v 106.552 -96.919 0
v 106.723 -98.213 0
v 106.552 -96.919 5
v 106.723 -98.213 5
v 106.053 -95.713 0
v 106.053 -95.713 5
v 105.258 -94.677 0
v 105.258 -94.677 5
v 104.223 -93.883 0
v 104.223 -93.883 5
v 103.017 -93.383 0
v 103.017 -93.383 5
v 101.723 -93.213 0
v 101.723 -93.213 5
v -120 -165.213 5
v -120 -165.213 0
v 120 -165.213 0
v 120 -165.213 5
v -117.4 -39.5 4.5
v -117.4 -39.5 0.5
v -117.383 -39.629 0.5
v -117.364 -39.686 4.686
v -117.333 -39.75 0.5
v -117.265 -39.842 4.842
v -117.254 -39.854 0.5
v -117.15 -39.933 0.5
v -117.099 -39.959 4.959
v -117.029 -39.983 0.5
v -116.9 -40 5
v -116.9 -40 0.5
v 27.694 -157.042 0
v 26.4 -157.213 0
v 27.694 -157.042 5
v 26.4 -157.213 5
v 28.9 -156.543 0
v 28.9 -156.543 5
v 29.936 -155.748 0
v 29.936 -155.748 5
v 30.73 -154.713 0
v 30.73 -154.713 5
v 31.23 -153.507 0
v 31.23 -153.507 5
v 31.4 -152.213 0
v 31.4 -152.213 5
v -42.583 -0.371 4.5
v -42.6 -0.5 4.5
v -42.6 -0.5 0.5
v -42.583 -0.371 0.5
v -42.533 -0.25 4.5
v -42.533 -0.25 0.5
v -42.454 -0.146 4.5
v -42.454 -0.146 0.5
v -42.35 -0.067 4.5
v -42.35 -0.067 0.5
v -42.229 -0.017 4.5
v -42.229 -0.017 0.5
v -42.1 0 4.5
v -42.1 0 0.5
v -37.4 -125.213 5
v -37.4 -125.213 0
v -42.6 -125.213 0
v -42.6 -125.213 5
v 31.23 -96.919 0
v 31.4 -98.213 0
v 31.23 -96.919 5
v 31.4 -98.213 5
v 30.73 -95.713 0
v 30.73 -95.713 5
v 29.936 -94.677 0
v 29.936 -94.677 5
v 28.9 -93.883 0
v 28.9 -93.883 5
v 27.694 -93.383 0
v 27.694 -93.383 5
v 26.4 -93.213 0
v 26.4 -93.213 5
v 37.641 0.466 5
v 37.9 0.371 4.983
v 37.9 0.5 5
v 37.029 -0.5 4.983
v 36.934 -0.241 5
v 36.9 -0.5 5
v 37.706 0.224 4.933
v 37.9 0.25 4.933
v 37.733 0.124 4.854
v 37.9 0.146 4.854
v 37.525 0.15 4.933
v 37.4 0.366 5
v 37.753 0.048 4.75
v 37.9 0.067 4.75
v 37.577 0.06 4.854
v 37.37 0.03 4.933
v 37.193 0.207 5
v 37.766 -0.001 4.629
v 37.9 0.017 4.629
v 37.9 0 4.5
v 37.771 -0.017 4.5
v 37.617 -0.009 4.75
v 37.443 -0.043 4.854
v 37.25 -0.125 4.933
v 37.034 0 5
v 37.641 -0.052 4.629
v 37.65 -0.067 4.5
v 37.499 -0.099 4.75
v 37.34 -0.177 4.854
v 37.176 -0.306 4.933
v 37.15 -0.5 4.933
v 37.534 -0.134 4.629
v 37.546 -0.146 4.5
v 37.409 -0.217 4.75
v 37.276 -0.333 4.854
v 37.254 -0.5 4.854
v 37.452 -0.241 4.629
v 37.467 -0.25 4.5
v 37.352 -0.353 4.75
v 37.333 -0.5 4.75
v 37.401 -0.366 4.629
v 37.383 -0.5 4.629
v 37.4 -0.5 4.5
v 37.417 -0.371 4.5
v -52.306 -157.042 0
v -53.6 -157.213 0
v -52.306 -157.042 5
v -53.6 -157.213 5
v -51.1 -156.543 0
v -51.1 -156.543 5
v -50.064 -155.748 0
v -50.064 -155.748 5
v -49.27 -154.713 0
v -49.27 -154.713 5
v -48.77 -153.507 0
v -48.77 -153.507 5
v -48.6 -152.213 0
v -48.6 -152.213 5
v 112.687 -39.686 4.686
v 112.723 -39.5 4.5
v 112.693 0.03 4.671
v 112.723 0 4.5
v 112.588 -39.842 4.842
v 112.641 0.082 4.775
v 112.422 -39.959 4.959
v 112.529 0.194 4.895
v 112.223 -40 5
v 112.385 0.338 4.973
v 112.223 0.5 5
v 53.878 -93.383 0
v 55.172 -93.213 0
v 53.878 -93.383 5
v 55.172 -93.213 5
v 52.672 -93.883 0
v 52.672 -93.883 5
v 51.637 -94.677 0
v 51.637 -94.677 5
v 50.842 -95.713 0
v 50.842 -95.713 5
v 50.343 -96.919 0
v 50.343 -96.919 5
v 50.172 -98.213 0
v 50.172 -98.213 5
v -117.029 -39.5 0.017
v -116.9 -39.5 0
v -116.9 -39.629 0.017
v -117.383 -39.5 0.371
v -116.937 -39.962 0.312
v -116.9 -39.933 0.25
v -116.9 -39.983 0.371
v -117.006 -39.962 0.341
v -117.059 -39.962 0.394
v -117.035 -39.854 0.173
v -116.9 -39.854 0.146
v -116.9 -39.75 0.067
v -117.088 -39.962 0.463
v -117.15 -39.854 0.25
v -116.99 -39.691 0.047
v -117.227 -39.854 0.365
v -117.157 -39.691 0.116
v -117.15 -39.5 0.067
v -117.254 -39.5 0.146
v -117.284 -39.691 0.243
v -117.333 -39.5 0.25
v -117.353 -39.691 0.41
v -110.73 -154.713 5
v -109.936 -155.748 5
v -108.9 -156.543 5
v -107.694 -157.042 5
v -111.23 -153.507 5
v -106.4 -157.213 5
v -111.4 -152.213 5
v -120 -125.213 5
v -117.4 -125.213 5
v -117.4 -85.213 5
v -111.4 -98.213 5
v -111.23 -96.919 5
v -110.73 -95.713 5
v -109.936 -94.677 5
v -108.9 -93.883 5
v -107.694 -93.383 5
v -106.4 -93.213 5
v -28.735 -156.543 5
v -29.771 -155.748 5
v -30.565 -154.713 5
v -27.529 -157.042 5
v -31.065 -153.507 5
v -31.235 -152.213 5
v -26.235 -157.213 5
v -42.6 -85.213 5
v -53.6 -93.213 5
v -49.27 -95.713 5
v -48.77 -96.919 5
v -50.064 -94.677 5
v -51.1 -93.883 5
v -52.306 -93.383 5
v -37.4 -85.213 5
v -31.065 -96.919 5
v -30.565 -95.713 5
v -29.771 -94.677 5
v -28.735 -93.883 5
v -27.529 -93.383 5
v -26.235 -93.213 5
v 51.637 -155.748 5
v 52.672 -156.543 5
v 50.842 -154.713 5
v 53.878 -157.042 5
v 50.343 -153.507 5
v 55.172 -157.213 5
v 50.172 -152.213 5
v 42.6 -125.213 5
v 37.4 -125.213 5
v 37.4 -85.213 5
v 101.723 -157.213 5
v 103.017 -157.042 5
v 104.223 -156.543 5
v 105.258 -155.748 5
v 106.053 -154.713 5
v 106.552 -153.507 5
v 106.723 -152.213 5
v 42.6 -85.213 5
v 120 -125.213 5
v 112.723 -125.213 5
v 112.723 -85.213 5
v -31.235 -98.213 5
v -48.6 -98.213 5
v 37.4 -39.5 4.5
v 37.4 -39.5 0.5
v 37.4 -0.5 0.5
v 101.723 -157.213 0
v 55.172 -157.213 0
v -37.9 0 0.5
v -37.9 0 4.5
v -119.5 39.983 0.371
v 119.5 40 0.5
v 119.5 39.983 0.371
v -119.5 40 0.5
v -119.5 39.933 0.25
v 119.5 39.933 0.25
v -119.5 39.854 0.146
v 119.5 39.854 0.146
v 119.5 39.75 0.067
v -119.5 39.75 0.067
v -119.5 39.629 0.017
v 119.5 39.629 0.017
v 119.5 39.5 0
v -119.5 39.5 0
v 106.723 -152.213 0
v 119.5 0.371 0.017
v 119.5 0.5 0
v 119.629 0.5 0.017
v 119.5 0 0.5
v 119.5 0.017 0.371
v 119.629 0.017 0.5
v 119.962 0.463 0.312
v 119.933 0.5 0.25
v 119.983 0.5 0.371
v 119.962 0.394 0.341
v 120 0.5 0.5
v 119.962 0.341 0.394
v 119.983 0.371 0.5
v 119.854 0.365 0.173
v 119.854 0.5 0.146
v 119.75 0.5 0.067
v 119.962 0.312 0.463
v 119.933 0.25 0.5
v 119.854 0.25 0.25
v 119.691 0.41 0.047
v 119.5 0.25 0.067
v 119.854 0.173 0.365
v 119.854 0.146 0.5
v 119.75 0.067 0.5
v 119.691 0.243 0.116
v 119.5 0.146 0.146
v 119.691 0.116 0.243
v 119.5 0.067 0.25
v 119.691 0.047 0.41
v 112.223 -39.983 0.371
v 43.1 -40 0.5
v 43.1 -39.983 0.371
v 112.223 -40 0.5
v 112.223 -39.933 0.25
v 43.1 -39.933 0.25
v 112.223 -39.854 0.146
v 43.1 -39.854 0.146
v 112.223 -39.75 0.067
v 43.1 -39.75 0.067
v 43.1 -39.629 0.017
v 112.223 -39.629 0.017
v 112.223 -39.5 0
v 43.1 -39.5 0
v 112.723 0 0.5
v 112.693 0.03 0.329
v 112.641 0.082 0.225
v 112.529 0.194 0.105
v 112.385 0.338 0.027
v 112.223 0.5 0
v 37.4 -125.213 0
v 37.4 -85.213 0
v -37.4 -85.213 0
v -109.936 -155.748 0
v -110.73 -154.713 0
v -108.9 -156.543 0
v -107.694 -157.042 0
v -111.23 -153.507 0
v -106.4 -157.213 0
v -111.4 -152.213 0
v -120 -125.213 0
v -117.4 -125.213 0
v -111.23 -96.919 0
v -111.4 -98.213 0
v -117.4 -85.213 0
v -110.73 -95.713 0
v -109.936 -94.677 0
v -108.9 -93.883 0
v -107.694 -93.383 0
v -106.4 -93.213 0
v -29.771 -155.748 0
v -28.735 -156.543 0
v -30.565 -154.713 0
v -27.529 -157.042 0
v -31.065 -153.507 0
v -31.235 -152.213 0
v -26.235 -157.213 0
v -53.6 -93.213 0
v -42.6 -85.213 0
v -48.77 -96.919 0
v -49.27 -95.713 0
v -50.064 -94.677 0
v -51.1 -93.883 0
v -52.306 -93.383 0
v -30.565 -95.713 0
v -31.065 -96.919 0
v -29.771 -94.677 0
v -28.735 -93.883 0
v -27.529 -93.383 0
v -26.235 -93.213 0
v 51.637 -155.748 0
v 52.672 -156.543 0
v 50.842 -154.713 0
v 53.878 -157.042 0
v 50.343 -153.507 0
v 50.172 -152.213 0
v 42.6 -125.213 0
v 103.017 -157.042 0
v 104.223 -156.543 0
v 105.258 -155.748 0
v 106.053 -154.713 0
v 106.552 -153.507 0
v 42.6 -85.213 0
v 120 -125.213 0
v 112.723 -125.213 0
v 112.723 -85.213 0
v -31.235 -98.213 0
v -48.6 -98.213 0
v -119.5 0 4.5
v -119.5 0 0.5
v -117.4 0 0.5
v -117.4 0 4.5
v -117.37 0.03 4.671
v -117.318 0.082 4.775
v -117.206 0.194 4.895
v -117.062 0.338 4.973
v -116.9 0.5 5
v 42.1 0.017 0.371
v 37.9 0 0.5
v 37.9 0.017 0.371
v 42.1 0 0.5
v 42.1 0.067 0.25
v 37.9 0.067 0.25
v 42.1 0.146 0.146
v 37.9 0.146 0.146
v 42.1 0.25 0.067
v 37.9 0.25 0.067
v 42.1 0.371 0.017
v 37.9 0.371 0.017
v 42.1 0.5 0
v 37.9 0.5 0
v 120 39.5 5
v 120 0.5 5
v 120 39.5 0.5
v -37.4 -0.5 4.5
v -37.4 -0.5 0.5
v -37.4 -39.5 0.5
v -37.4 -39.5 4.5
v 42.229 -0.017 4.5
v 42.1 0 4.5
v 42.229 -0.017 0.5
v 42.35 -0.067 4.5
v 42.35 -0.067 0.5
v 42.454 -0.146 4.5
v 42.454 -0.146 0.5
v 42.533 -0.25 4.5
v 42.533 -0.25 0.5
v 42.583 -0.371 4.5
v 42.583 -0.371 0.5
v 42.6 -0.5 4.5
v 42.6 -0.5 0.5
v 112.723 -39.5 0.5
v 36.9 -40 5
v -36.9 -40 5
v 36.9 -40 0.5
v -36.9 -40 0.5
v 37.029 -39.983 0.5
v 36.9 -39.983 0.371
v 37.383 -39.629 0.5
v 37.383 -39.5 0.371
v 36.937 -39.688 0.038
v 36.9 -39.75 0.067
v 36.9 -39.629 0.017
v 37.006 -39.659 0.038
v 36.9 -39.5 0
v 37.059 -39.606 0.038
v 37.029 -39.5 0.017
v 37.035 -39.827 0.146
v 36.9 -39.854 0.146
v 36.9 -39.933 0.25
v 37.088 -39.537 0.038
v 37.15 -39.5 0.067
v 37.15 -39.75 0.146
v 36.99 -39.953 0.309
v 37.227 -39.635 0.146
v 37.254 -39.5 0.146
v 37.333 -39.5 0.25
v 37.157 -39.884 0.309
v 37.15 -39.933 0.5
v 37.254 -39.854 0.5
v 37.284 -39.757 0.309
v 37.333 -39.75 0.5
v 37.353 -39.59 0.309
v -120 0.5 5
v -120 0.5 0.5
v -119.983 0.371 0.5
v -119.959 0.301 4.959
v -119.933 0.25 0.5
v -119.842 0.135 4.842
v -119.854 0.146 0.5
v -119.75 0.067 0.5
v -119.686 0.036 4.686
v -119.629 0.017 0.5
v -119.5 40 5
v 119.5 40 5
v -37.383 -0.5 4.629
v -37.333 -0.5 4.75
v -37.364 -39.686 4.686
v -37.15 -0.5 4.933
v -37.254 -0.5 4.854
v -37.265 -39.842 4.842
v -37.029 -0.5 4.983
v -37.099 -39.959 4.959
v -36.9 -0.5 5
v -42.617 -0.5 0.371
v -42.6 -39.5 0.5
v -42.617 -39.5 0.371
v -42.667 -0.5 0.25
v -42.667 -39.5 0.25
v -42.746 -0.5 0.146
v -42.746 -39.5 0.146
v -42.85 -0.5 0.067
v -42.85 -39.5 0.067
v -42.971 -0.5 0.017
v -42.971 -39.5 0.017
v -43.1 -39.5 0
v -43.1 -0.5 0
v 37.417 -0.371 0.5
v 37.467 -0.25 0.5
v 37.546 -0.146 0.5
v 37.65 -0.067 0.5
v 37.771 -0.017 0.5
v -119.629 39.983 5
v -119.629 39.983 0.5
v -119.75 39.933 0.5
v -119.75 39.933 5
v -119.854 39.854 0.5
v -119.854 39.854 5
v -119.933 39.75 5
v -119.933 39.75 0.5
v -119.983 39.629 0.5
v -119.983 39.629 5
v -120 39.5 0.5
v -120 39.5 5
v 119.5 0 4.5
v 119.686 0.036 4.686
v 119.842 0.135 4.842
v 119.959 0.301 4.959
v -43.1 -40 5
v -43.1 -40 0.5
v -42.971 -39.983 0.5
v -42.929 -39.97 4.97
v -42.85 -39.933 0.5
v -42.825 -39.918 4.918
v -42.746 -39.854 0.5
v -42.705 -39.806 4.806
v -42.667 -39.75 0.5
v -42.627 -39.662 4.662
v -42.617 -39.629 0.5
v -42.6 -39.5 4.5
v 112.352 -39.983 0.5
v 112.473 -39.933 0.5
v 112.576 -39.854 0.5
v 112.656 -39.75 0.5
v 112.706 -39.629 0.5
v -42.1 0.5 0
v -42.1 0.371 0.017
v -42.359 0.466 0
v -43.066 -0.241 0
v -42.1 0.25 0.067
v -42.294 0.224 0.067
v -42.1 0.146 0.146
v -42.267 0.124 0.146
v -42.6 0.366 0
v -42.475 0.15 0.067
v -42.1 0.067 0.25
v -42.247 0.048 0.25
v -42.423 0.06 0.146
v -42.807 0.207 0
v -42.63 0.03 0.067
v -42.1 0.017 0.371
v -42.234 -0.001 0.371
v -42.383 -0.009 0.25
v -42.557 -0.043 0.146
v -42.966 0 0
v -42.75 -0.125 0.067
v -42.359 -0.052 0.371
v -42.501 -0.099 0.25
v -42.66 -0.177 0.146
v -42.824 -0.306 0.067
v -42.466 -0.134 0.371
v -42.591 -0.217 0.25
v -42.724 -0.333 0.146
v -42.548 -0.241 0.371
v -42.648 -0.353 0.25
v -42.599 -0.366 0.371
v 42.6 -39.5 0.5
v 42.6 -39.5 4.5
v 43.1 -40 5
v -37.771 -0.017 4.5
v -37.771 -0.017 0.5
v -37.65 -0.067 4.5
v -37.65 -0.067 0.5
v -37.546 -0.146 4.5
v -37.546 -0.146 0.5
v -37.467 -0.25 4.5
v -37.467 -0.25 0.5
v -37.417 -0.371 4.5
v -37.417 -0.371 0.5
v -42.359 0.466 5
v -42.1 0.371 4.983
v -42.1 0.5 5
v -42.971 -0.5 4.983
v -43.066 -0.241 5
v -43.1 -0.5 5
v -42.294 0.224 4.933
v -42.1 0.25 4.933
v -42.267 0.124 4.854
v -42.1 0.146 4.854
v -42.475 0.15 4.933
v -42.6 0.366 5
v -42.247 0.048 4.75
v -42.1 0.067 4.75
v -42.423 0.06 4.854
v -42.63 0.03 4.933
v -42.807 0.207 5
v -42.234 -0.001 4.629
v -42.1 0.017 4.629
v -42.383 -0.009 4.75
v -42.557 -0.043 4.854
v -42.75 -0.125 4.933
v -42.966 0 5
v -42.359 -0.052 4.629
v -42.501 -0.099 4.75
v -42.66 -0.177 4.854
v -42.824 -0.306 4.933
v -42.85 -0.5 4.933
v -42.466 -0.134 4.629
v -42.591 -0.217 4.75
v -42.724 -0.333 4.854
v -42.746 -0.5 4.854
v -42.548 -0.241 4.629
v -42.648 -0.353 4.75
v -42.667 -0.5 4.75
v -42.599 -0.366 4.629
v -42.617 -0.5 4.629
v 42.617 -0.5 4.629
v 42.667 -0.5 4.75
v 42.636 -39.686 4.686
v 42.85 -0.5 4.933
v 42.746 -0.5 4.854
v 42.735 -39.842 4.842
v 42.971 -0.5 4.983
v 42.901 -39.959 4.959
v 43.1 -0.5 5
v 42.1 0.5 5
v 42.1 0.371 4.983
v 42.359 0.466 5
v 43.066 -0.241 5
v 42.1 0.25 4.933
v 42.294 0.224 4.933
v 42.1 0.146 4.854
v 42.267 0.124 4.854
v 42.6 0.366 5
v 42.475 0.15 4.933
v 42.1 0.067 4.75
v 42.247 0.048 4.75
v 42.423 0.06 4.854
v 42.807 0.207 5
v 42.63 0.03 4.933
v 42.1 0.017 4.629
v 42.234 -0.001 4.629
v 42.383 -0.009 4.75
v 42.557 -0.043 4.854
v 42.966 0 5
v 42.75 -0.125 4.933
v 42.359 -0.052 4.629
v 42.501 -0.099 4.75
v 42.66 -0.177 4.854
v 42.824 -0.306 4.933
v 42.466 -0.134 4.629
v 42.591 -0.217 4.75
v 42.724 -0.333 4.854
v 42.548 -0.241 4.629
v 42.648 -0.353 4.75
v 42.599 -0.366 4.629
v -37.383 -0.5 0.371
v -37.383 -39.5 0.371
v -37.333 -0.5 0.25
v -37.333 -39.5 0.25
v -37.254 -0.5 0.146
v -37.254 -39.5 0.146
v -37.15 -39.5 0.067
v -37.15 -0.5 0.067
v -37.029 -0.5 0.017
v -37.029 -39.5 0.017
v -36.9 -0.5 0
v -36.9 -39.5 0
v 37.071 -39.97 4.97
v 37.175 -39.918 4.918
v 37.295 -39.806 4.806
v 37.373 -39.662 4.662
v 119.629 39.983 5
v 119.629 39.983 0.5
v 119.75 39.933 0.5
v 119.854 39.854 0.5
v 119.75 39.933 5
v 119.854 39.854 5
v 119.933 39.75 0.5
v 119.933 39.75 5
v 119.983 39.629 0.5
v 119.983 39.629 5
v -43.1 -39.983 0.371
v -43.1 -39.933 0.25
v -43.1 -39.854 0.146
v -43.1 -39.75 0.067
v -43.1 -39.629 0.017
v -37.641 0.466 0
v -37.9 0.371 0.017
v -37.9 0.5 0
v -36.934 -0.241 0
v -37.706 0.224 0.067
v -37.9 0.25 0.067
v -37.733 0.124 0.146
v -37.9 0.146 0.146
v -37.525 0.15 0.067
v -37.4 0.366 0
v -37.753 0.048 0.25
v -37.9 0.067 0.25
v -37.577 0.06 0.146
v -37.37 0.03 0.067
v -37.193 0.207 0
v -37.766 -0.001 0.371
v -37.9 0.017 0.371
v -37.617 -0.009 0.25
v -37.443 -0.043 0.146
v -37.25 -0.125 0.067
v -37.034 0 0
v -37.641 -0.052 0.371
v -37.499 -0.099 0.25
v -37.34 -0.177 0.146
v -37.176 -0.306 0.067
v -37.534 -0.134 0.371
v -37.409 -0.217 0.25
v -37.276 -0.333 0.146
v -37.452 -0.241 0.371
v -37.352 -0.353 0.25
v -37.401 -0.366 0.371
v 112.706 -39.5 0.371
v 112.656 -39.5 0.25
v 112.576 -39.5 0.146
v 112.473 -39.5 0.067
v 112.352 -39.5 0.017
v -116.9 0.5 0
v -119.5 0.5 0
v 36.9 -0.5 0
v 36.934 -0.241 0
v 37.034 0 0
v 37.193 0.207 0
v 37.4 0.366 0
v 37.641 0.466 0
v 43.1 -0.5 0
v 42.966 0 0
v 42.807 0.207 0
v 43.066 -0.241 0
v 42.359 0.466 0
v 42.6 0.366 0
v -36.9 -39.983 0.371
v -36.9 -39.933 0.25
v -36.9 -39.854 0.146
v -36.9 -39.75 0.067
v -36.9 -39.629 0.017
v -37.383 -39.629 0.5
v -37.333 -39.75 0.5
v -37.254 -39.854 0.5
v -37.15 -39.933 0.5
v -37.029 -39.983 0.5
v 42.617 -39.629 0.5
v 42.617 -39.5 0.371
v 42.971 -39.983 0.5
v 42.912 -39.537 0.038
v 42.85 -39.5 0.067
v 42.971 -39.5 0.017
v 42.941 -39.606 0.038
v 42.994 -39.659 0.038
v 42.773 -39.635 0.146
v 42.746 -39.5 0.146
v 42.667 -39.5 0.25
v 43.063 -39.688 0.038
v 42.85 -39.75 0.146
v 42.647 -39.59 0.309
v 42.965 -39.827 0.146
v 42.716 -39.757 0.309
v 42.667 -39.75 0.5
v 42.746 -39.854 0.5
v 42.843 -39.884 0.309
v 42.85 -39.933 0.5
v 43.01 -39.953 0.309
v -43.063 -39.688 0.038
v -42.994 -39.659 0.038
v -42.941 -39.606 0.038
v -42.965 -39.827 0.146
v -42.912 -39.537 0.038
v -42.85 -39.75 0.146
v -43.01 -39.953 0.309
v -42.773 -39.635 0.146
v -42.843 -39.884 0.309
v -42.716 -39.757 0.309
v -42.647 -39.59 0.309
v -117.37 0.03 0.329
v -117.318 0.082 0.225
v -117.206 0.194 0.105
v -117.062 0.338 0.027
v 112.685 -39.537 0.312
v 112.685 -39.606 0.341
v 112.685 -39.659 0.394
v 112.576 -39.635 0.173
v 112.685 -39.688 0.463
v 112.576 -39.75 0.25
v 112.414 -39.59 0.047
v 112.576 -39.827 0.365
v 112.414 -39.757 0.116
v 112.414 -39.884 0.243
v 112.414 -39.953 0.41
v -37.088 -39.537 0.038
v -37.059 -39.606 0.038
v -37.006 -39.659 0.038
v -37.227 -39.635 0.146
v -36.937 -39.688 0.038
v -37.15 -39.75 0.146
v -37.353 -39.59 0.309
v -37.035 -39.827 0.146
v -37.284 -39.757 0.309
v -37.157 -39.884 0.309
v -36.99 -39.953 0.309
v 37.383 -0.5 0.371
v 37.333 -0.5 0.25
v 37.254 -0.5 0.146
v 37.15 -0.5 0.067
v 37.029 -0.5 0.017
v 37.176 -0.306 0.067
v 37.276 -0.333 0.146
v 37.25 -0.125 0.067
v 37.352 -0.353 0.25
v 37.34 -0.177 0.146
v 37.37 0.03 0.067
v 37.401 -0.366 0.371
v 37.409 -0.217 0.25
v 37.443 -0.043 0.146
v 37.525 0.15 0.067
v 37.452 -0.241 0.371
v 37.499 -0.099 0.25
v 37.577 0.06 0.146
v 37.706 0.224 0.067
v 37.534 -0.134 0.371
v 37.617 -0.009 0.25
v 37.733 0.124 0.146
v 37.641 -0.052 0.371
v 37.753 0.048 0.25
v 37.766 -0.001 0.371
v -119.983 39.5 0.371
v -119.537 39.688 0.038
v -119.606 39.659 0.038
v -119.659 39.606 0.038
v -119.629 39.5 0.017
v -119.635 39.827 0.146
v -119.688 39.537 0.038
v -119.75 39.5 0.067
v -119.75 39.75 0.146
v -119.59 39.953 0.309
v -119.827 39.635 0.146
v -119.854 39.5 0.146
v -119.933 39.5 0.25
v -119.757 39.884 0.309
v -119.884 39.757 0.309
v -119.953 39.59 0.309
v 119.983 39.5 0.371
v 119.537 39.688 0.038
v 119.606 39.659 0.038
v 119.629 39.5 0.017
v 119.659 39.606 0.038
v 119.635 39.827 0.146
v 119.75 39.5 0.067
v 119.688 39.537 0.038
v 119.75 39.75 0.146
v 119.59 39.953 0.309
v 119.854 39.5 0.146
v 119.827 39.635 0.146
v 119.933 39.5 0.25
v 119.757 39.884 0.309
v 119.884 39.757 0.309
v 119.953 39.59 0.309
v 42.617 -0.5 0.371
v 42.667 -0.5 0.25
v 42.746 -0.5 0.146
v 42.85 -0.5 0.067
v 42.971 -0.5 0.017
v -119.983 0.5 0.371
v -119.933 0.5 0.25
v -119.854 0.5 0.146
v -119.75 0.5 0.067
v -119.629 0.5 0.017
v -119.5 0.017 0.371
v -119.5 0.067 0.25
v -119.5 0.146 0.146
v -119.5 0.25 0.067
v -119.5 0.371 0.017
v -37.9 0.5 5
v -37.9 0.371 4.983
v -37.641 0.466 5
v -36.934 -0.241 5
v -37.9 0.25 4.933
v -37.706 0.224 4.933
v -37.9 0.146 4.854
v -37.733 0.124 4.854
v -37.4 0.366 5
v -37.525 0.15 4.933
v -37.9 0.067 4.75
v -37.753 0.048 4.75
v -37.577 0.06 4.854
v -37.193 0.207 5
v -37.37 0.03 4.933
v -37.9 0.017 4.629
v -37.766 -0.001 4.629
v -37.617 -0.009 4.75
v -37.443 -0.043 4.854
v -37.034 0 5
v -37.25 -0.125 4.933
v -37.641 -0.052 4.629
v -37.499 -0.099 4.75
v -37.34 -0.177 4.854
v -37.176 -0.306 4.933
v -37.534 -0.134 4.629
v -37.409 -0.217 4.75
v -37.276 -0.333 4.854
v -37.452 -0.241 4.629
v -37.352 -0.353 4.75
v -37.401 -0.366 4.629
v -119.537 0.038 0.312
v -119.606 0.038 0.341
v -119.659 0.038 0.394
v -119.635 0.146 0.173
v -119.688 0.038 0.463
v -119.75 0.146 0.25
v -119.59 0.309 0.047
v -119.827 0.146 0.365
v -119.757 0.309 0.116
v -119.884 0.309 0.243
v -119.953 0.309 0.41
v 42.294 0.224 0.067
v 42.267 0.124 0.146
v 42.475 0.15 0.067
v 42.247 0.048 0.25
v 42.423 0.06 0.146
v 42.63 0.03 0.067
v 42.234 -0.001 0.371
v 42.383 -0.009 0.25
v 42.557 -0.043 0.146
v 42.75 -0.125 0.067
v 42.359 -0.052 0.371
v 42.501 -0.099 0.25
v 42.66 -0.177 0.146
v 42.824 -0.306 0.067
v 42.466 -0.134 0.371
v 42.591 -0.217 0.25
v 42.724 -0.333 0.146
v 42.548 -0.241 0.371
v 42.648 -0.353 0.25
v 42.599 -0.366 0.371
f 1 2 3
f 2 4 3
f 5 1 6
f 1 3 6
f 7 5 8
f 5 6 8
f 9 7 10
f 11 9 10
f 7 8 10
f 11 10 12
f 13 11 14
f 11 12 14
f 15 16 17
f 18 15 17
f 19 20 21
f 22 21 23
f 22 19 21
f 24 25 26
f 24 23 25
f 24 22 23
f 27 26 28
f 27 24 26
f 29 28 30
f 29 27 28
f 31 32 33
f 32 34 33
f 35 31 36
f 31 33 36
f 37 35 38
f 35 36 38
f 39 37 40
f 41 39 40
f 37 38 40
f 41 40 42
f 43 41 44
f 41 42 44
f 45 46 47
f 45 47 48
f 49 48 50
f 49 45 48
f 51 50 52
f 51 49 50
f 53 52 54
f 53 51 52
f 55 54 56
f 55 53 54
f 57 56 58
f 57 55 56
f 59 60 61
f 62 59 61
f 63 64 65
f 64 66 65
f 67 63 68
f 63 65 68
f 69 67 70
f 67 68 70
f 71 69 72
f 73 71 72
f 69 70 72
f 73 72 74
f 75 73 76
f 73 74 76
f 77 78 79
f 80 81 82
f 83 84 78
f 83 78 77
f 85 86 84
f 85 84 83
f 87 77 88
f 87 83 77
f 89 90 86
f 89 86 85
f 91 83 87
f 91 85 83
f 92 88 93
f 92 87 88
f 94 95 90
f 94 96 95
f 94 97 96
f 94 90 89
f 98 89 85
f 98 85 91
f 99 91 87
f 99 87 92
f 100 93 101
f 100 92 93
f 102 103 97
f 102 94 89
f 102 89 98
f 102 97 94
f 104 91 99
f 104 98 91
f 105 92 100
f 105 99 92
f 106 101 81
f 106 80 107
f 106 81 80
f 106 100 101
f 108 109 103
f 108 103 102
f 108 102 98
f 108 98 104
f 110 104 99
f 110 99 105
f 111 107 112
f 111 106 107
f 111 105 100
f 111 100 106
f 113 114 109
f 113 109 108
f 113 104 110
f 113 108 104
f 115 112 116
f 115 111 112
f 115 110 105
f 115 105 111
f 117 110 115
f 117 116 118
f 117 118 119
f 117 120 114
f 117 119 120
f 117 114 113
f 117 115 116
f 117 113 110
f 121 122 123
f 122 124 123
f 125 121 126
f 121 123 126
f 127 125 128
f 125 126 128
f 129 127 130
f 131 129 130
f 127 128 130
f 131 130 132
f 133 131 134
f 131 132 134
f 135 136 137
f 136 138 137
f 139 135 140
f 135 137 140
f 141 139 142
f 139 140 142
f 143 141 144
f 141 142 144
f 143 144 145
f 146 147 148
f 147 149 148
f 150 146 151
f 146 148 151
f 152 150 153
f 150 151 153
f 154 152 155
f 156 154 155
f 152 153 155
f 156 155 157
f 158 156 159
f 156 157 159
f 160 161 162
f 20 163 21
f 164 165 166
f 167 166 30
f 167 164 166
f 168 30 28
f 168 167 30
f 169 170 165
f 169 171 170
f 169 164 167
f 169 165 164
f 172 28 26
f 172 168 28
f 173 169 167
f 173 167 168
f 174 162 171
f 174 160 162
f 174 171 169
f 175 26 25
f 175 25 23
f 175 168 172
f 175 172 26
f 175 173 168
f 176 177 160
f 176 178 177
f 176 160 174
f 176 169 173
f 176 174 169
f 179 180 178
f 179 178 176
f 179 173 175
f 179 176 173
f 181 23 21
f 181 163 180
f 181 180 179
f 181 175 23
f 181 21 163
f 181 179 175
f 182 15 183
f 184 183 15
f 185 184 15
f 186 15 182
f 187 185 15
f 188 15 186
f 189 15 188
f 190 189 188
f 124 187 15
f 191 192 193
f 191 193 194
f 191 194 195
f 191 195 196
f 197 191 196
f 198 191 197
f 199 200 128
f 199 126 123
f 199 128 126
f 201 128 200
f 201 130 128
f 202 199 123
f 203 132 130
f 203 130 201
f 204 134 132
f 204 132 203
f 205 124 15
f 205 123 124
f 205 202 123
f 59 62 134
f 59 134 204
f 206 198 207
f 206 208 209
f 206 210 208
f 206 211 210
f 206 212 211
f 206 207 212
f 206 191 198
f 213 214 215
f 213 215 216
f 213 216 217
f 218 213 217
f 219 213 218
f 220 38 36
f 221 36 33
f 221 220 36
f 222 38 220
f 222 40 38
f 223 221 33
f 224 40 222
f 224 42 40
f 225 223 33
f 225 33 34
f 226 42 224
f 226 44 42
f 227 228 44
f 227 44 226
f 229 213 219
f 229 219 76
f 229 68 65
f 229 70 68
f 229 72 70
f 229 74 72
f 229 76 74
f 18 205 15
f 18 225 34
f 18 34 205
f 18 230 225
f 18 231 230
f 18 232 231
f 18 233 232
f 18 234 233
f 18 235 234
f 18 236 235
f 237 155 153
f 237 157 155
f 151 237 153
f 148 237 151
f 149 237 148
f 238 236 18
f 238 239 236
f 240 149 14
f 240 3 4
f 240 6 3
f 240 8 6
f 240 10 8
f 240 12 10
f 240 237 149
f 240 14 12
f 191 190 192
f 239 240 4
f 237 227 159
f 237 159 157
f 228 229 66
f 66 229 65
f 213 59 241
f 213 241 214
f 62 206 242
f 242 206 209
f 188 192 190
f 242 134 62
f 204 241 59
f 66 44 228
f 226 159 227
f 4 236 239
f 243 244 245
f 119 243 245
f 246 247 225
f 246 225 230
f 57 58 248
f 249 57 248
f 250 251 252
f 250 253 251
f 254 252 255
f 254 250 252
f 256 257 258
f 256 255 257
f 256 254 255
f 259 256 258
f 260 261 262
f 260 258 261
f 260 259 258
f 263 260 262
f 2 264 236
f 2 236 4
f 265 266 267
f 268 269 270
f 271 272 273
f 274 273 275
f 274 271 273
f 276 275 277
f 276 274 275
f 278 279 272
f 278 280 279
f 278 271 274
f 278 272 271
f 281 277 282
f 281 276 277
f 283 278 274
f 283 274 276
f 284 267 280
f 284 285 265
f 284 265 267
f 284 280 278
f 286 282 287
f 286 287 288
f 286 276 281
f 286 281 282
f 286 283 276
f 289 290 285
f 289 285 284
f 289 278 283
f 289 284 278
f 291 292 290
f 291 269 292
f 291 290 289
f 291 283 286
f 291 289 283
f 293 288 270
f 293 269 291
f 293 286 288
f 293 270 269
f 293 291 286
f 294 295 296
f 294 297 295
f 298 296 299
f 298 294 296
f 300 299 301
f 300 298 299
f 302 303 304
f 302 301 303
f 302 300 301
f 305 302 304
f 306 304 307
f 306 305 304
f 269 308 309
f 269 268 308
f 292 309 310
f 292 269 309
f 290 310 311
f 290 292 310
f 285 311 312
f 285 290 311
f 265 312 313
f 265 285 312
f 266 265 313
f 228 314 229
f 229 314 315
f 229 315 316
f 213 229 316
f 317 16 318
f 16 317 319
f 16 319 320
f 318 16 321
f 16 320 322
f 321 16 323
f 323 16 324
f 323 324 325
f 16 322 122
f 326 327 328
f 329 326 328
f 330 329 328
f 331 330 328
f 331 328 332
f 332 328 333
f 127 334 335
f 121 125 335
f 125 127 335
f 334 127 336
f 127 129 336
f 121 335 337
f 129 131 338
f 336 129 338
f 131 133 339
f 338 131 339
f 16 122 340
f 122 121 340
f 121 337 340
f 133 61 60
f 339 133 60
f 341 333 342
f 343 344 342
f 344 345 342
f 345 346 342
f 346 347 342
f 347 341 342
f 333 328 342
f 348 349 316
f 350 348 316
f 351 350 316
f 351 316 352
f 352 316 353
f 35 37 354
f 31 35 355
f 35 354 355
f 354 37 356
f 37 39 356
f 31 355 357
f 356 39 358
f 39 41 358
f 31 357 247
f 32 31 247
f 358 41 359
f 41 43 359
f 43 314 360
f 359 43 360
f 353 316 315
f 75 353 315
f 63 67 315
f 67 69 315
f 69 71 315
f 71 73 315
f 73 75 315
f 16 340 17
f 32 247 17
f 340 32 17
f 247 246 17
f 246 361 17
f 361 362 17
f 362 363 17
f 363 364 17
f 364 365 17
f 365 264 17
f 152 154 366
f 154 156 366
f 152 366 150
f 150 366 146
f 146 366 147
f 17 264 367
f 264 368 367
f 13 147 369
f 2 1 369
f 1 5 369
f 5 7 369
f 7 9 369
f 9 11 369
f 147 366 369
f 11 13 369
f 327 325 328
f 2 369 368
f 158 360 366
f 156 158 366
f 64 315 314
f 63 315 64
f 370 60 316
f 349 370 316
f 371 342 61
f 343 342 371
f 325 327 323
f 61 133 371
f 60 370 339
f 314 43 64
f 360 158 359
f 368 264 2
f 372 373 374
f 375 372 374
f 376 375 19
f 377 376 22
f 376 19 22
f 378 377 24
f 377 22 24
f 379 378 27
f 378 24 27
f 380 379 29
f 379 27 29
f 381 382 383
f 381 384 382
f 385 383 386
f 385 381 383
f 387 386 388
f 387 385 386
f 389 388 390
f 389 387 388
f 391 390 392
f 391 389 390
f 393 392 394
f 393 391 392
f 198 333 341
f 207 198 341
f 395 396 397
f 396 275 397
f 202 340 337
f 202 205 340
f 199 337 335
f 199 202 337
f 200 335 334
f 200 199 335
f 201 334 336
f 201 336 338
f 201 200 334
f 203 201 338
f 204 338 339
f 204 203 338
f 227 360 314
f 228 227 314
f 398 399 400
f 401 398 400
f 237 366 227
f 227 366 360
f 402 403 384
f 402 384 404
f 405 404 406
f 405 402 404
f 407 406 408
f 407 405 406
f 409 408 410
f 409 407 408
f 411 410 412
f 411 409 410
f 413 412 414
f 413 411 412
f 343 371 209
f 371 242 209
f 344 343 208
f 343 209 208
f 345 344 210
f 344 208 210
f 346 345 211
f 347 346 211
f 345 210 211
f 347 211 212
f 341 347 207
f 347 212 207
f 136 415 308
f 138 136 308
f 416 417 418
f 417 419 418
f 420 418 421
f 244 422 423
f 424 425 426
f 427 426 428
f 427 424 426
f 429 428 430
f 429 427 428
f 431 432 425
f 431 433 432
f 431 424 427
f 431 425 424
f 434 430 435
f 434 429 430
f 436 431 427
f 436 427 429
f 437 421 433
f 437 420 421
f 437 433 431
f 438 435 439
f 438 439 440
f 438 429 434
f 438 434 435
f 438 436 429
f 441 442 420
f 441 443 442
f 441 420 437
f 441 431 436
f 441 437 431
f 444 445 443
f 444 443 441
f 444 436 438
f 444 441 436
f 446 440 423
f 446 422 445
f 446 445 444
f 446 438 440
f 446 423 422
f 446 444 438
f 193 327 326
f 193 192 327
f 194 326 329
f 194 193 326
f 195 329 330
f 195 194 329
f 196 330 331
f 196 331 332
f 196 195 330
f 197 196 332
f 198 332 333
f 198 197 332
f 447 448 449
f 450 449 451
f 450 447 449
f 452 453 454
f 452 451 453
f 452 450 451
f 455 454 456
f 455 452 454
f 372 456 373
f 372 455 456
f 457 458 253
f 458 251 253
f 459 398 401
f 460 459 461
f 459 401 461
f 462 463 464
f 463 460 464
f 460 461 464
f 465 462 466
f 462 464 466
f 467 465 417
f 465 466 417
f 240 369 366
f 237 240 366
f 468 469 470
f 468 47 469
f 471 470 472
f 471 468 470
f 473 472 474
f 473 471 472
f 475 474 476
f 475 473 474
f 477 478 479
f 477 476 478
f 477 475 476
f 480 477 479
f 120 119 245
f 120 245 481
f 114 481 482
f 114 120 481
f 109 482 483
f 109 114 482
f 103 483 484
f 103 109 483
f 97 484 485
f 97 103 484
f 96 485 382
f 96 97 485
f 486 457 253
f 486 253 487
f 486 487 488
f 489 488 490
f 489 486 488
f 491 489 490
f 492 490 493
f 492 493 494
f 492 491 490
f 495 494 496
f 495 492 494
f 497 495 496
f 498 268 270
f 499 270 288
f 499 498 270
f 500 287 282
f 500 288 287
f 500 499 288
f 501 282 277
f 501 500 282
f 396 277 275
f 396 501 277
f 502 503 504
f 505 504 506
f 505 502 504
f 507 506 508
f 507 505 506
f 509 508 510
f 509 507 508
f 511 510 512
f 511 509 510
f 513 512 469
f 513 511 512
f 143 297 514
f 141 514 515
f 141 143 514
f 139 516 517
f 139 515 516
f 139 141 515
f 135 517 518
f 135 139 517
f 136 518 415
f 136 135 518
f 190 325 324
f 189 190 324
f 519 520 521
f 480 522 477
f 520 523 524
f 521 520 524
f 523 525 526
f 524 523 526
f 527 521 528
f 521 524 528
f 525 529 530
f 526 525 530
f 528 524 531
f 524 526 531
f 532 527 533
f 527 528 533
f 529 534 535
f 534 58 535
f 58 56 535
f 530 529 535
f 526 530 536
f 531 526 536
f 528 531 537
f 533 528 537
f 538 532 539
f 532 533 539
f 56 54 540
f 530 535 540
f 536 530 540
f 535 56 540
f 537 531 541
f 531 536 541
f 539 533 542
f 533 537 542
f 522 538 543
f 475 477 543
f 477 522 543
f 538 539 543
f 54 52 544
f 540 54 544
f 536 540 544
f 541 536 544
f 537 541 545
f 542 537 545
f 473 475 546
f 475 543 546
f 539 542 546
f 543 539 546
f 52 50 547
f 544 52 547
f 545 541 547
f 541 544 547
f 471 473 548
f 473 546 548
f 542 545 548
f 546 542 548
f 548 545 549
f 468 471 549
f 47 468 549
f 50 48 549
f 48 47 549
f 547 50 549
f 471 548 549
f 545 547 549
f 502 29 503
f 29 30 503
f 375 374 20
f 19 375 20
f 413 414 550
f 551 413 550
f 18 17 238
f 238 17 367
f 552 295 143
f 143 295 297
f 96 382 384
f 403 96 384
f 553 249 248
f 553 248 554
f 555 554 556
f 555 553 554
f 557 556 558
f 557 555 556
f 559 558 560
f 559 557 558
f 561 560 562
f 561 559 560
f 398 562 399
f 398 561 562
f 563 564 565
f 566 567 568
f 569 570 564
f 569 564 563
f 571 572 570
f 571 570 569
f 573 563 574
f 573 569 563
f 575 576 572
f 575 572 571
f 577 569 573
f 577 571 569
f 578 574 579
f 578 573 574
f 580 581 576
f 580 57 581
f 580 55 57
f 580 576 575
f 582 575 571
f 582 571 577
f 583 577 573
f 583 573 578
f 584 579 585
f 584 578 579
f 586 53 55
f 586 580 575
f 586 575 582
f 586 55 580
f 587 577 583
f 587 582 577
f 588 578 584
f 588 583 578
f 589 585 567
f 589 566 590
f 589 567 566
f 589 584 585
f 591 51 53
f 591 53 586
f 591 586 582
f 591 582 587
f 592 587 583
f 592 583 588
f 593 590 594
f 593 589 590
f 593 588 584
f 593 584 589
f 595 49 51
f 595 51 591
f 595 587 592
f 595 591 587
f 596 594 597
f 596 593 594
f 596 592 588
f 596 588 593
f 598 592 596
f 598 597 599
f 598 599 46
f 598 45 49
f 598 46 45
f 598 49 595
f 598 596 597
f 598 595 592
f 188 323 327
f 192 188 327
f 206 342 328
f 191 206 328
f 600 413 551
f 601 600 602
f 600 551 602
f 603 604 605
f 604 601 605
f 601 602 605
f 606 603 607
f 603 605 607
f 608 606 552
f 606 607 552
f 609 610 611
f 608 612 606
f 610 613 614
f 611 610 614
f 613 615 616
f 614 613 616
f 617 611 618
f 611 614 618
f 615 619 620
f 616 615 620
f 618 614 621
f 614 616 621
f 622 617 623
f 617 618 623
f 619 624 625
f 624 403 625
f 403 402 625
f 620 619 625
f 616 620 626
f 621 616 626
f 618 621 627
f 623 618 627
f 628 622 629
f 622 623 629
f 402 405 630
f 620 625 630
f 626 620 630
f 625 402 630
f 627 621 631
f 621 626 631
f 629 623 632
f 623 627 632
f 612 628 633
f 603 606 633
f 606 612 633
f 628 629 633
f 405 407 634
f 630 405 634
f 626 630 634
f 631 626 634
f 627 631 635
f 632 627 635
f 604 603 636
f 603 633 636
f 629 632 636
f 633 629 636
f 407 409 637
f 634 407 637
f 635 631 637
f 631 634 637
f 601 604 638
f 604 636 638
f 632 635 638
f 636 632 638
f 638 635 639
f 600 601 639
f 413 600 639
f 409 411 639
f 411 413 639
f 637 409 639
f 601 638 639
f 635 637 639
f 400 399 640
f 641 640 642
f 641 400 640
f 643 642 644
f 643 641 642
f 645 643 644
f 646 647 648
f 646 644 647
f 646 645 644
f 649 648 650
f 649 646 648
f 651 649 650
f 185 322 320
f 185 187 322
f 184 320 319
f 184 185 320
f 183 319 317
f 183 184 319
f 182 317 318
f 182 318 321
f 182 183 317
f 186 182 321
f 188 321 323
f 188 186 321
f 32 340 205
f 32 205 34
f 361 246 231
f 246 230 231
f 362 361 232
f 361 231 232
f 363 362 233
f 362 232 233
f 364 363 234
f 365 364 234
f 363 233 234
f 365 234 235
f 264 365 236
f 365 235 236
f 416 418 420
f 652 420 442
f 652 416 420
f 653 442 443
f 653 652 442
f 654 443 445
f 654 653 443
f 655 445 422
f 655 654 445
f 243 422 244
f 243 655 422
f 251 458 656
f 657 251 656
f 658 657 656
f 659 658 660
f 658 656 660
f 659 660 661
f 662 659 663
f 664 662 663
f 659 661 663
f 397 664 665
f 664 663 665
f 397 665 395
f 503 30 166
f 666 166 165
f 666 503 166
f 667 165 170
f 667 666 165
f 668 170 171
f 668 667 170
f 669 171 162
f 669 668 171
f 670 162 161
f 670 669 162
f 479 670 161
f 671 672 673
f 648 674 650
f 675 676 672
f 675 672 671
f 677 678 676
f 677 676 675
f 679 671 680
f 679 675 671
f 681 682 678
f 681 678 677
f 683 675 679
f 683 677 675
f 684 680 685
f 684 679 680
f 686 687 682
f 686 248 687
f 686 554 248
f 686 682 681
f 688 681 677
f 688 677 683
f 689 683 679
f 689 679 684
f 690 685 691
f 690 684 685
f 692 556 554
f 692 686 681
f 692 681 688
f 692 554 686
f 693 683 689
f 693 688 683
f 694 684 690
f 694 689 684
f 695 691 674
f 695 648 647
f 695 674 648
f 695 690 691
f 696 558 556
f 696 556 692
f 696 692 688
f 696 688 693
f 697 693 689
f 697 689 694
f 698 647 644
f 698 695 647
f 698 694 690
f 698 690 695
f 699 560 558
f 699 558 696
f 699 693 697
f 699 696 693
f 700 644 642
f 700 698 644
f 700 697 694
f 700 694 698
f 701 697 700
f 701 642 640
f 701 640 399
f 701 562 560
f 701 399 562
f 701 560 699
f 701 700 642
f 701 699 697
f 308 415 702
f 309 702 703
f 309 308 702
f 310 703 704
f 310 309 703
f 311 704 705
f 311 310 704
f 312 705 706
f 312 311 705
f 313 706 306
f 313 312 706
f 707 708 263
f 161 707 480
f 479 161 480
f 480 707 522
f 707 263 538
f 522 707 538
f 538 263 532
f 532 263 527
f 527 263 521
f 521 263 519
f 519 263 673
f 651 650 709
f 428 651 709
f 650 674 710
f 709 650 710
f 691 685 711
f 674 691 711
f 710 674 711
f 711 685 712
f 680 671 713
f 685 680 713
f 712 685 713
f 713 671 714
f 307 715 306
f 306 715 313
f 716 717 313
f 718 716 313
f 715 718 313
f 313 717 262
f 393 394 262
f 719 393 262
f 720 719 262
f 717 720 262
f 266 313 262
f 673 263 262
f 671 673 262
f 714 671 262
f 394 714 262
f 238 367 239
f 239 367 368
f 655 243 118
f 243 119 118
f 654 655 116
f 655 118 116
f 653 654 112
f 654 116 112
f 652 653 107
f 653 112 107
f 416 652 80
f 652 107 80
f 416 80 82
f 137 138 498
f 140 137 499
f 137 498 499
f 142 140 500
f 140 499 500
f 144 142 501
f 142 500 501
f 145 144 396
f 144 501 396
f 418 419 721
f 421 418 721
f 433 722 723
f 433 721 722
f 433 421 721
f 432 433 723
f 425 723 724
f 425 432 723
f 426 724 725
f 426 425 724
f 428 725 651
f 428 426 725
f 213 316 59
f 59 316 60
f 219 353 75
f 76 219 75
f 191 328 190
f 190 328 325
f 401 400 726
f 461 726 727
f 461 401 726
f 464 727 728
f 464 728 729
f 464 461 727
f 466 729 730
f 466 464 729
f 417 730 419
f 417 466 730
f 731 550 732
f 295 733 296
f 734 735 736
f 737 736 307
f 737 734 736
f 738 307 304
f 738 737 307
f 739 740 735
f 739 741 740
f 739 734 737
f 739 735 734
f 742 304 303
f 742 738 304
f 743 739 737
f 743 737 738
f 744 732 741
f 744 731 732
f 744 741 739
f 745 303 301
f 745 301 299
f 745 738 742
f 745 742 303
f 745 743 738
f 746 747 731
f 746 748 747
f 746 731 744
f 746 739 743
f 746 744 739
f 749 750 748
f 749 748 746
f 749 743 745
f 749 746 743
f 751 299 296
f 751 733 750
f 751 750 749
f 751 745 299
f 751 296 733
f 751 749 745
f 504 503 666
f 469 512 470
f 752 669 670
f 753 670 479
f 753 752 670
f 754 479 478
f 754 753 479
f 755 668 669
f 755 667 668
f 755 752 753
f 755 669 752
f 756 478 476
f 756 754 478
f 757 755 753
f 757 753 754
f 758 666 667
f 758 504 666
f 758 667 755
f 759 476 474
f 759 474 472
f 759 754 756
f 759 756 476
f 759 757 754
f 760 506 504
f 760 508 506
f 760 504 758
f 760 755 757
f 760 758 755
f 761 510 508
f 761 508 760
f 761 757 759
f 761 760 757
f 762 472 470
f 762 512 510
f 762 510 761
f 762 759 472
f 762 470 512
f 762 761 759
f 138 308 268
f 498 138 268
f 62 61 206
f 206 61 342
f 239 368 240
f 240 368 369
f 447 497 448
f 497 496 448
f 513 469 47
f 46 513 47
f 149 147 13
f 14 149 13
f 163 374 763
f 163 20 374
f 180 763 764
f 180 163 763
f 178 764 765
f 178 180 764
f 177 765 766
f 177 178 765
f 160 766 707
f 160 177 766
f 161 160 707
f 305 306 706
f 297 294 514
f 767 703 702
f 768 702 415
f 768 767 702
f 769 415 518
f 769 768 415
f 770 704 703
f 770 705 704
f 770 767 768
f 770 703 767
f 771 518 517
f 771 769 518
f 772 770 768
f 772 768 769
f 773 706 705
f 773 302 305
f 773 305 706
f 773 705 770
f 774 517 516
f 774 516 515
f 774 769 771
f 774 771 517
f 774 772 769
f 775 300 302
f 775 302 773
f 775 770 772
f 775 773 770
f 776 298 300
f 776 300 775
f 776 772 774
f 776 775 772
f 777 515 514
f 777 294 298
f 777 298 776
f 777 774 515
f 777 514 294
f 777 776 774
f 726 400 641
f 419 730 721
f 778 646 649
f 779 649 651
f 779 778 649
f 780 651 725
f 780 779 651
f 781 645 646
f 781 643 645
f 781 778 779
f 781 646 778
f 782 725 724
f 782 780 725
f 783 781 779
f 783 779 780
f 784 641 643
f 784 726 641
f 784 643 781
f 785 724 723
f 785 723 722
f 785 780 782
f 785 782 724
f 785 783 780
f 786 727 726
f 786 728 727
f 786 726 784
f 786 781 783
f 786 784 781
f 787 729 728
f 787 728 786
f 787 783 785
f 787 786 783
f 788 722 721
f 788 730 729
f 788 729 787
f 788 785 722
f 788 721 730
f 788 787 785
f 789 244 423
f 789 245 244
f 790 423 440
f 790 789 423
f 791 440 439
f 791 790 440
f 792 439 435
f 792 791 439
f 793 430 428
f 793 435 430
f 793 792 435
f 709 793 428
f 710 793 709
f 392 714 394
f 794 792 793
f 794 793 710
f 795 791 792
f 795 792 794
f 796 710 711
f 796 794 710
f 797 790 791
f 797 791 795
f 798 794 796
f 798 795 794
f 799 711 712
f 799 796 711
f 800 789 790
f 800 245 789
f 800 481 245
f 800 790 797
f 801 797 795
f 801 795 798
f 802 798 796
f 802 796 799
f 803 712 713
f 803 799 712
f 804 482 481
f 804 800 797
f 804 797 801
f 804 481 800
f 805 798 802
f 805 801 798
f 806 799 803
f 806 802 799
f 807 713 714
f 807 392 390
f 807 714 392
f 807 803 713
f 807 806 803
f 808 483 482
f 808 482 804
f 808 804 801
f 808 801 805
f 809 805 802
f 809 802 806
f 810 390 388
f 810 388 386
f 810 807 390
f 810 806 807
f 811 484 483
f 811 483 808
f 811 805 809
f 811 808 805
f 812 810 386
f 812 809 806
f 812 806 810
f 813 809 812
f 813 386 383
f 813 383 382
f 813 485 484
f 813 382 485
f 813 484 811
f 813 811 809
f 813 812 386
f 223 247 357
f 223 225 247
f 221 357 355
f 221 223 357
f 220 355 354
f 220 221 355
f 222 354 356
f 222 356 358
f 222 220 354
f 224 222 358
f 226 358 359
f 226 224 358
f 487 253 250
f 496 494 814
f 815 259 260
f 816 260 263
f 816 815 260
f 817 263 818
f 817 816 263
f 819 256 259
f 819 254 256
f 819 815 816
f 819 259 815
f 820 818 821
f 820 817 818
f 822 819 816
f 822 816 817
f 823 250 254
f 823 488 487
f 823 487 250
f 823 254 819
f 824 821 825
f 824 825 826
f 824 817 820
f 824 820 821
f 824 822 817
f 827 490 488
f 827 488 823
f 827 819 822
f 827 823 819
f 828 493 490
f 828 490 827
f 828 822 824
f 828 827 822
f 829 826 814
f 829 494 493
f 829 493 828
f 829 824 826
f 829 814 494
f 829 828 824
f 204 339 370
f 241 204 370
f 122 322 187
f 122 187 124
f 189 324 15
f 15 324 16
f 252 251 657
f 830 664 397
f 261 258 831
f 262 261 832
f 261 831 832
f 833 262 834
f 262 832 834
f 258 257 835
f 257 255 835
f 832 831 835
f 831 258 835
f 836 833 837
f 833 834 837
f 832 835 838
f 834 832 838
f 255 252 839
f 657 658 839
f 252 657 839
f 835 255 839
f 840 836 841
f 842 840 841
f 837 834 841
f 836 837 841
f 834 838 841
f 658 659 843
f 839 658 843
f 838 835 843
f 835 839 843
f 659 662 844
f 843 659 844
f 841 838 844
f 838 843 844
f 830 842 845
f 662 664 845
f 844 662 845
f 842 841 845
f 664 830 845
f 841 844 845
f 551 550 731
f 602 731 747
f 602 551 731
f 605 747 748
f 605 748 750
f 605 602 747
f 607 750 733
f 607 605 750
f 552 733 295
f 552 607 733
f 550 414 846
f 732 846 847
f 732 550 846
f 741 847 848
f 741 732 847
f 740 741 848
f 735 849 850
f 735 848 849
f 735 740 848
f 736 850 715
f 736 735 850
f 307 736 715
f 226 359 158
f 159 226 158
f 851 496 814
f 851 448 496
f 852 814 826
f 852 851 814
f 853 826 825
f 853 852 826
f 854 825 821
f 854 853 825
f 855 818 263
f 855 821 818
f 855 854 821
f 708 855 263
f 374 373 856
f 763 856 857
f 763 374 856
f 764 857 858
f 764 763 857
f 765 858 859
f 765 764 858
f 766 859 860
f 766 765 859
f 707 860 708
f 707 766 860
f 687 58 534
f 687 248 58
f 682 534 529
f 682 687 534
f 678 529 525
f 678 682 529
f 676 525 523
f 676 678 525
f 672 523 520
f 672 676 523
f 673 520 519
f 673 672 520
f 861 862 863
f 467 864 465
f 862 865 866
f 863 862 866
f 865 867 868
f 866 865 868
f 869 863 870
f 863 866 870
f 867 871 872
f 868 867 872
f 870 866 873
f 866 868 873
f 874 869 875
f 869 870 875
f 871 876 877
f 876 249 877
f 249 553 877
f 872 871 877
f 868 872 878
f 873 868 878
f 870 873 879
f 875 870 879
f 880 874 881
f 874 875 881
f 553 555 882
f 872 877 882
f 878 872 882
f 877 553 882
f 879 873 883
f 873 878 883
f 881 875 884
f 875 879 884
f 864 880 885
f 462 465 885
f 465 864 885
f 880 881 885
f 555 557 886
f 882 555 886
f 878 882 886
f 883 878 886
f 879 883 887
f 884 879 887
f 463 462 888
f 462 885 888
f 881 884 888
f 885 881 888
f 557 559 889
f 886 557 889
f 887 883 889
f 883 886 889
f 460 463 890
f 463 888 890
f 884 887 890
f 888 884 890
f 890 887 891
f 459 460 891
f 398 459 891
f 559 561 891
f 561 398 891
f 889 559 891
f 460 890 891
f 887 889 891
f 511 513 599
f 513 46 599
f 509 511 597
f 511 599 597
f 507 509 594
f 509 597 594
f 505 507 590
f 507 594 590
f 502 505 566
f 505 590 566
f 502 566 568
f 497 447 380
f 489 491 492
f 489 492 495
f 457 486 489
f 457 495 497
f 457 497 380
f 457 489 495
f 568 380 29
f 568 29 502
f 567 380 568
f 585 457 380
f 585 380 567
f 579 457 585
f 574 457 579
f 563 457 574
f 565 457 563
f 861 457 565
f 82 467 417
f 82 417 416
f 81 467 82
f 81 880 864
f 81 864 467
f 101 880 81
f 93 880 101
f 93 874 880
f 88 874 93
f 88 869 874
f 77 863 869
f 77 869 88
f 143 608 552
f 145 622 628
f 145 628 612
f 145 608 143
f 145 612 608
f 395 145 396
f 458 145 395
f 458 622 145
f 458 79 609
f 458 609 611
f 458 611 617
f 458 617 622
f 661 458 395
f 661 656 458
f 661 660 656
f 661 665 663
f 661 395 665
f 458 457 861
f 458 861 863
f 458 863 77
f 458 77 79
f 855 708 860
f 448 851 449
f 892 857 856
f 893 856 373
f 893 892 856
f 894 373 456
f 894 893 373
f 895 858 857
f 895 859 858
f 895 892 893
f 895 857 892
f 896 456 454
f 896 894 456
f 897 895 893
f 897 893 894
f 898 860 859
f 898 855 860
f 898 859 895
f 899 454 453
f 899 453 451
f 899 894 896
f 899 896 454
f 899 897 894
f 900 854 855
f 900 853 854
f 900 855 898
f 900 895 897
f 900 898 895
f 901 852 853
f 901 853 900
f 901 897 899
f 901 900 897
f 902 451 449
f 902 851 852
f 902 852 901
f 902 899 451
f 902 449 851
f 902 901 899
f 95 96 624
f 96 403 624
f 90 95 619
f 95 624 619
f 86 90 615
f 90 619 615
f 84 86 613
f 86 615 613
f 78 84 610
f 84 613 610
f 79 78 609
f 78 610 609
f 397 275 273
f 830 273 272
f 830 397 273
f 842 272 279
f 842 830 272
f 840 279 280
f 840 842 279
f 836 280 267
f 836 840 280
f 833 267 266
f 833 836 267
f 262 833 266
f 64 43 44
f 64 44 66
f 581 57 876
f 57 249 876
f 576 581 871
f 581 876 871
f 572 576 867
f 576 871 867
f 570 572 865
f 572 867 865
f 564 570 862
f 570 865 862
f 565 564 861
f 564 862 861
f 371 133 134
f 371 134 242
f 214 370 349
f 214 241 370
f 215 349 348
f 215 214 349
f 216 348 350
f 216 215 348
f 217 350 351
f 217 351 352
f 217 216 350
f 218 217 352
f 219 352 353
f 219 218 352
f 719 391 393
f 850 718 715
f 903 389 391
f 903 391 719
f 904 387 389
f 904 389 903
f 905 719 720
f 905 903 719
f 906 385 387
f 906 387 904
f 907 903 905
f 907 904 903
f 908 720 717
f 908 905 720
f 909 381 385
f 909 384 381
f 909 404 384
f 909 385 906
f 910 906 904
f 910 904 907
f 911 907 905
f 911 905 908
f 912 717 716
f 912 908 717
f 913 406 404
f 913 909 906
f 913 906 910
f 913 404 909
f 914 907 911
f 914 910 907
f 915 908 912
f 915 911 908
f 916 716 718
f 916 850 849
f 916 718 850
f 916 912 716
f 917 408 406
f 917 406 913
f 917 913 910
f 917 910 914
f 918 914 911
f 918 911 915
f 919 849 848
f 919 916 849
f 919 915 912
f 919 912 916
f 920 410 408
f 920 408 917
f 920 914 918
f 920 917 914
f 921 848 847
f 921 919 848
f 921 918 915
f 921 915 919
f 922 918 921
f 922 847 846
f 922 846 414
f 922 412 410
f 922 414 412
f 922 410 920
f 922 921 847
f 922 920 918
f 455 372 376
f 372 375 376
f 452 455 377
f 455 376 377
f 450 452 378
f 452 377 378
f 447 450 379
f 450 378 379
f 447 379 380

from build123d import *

# Parameters (mm, degrees)
F1_DEPTH = 5
F0_W     = 62.8
F0_H     = 64
F0_W_2   = 62.635196808
F0_W_3   = 56.5503612161
F2_R     = 0.5
F3_R     = 5


with BuildPart() as f1:
    # F0 (on Top) → F1 (new body)
    with BuildSketch(Plane.XY):
        Polygon((120, 40), (-120, 40), (-120, 0), (-117.4, 0), (-117.4, -40), (-42.6, -40), (-42.6, 0), (-37.4, 0), (-37.4, -40), (37.4, -40), (37.4, 0), (42.6, 0), (42.6, -40), (112.7228473783, -40), (112.7228473783, 0), (120, 0), align=None)
    extrude(amount=F1_DEPTH)

    # F2
    f2_edges = [f1.edges().sort_by_distance(p)[0] for p in [
        (-42.6, -40, 2.5),
        (-37.4, -40, 2.5),
        (37.4, -40, 2.5),
        (42.6, -40, 2.5),
        (-120, 40, 2.5),
        (120, 40, 2.5),
        (42.6, 0, 2.5),
        (37.4, 0, 2.5),
        (-37.4, 0, 2.5),
        (-42.6, 0, 2.5),
        (-40, 0, 0),
        (0, 40, 0),
        (-120, 20, 0),
        (-118.7, 0, 0),
        (-117.4, -20, 0),
        (-80, -40, 0),
        (-42.6, -20, 0),
        (-37.4, -20, 0),
        (0, -40, 0),
        (37.4, -20, 0),
        (40, 0, 0),
        (42.6, -20, 0),
        (77.661424, -40, 0),
        (112.722847, -20, 0),
        (116.361424, 0, 0),
        (120, 20, 0),
        (-40, 0, 5),
        (40, 0, 5),
        (-117.4, -20, 5),
        (-118.7, 0, 5),
        (112.722847, -20, 5),
        (116.361424, 0, 5),
        (-120, 0, 2.5),
        (-117.4, -40, 2.5),
        (-42.6, -20, 5),
        (-37.4, -20, 5),
        (37.4, -20, 5),
        (42.6, -20, 5),
        (112.722847, -40, 2.5),
        (120, 0, 2.5),
    ]]
    fillet(f2_edges, radius=F2_R)


with BuildPart() as f1b:
    # F0 (on Top) → F1, piece 2 (new body)
    with BuildSketch(Plane.XY):
        Polygon((-42.6, -85.212714076), (-117.4, -85.212714076), (-117.4, -125.212714076), (-120, -125.212714076), (-120, -165.212714076), (120, -165.212714076), (120, -125.212714076), (112.7228473783, -125.212714076), (112.7228473783, -85.212714076), (42.6, -85.212714076), (42.6, -125.212714076), (37.4, -125.212714076), (37.4, -85.212714076), (-37.4, -85.212714076), (-37.4, -125.212714076), (-42.6, -125.212714076), align=None)
        with Locations((-80, -125.212714076)):
            Rectangle(F0_W, F0_H, mode=Mode.SUBTRACT)
        with Locations((0.082401596, -125.212714076)):
            Rectangle(F0_W_2, F0_H, mode=Mode.SUBTRACT)
        with Locations((78.4476667702, -125.212714076)):
            Rectangle(F0_W_3, F0_H, mode=Mode.SUBTRACT)
    extrude(amount=F1_DEPTH)

    # F3
    f3_edges = [f1b.edges().sort_by_distance(p)[0] for p in [
        (-111.4, -93.212714, 2.5),
        (-48.6, -93.212714, 2.5),
        (-111.4, -157.212714, 2.5),
        (-48.6, -157.212714, 2.5),
        (106.722847, -93.212714, 2.5),
        (31.4, -93.212714, 2.5),
        (31.4, -157.212714, 2.5),
        (106.722847, -157.212714, 2.5),
        (50.172486, -157.212714, 2.5),
        (-31.235197, -157.212714, 2.5),
        (-31.235197, -93.212714, 2.5),
        (50.172486, -93.212714, 2.5),
    ]]
    fillet(f3_edges, radius=F3_R)


solid = Compound([f1.part, f1b.part])
